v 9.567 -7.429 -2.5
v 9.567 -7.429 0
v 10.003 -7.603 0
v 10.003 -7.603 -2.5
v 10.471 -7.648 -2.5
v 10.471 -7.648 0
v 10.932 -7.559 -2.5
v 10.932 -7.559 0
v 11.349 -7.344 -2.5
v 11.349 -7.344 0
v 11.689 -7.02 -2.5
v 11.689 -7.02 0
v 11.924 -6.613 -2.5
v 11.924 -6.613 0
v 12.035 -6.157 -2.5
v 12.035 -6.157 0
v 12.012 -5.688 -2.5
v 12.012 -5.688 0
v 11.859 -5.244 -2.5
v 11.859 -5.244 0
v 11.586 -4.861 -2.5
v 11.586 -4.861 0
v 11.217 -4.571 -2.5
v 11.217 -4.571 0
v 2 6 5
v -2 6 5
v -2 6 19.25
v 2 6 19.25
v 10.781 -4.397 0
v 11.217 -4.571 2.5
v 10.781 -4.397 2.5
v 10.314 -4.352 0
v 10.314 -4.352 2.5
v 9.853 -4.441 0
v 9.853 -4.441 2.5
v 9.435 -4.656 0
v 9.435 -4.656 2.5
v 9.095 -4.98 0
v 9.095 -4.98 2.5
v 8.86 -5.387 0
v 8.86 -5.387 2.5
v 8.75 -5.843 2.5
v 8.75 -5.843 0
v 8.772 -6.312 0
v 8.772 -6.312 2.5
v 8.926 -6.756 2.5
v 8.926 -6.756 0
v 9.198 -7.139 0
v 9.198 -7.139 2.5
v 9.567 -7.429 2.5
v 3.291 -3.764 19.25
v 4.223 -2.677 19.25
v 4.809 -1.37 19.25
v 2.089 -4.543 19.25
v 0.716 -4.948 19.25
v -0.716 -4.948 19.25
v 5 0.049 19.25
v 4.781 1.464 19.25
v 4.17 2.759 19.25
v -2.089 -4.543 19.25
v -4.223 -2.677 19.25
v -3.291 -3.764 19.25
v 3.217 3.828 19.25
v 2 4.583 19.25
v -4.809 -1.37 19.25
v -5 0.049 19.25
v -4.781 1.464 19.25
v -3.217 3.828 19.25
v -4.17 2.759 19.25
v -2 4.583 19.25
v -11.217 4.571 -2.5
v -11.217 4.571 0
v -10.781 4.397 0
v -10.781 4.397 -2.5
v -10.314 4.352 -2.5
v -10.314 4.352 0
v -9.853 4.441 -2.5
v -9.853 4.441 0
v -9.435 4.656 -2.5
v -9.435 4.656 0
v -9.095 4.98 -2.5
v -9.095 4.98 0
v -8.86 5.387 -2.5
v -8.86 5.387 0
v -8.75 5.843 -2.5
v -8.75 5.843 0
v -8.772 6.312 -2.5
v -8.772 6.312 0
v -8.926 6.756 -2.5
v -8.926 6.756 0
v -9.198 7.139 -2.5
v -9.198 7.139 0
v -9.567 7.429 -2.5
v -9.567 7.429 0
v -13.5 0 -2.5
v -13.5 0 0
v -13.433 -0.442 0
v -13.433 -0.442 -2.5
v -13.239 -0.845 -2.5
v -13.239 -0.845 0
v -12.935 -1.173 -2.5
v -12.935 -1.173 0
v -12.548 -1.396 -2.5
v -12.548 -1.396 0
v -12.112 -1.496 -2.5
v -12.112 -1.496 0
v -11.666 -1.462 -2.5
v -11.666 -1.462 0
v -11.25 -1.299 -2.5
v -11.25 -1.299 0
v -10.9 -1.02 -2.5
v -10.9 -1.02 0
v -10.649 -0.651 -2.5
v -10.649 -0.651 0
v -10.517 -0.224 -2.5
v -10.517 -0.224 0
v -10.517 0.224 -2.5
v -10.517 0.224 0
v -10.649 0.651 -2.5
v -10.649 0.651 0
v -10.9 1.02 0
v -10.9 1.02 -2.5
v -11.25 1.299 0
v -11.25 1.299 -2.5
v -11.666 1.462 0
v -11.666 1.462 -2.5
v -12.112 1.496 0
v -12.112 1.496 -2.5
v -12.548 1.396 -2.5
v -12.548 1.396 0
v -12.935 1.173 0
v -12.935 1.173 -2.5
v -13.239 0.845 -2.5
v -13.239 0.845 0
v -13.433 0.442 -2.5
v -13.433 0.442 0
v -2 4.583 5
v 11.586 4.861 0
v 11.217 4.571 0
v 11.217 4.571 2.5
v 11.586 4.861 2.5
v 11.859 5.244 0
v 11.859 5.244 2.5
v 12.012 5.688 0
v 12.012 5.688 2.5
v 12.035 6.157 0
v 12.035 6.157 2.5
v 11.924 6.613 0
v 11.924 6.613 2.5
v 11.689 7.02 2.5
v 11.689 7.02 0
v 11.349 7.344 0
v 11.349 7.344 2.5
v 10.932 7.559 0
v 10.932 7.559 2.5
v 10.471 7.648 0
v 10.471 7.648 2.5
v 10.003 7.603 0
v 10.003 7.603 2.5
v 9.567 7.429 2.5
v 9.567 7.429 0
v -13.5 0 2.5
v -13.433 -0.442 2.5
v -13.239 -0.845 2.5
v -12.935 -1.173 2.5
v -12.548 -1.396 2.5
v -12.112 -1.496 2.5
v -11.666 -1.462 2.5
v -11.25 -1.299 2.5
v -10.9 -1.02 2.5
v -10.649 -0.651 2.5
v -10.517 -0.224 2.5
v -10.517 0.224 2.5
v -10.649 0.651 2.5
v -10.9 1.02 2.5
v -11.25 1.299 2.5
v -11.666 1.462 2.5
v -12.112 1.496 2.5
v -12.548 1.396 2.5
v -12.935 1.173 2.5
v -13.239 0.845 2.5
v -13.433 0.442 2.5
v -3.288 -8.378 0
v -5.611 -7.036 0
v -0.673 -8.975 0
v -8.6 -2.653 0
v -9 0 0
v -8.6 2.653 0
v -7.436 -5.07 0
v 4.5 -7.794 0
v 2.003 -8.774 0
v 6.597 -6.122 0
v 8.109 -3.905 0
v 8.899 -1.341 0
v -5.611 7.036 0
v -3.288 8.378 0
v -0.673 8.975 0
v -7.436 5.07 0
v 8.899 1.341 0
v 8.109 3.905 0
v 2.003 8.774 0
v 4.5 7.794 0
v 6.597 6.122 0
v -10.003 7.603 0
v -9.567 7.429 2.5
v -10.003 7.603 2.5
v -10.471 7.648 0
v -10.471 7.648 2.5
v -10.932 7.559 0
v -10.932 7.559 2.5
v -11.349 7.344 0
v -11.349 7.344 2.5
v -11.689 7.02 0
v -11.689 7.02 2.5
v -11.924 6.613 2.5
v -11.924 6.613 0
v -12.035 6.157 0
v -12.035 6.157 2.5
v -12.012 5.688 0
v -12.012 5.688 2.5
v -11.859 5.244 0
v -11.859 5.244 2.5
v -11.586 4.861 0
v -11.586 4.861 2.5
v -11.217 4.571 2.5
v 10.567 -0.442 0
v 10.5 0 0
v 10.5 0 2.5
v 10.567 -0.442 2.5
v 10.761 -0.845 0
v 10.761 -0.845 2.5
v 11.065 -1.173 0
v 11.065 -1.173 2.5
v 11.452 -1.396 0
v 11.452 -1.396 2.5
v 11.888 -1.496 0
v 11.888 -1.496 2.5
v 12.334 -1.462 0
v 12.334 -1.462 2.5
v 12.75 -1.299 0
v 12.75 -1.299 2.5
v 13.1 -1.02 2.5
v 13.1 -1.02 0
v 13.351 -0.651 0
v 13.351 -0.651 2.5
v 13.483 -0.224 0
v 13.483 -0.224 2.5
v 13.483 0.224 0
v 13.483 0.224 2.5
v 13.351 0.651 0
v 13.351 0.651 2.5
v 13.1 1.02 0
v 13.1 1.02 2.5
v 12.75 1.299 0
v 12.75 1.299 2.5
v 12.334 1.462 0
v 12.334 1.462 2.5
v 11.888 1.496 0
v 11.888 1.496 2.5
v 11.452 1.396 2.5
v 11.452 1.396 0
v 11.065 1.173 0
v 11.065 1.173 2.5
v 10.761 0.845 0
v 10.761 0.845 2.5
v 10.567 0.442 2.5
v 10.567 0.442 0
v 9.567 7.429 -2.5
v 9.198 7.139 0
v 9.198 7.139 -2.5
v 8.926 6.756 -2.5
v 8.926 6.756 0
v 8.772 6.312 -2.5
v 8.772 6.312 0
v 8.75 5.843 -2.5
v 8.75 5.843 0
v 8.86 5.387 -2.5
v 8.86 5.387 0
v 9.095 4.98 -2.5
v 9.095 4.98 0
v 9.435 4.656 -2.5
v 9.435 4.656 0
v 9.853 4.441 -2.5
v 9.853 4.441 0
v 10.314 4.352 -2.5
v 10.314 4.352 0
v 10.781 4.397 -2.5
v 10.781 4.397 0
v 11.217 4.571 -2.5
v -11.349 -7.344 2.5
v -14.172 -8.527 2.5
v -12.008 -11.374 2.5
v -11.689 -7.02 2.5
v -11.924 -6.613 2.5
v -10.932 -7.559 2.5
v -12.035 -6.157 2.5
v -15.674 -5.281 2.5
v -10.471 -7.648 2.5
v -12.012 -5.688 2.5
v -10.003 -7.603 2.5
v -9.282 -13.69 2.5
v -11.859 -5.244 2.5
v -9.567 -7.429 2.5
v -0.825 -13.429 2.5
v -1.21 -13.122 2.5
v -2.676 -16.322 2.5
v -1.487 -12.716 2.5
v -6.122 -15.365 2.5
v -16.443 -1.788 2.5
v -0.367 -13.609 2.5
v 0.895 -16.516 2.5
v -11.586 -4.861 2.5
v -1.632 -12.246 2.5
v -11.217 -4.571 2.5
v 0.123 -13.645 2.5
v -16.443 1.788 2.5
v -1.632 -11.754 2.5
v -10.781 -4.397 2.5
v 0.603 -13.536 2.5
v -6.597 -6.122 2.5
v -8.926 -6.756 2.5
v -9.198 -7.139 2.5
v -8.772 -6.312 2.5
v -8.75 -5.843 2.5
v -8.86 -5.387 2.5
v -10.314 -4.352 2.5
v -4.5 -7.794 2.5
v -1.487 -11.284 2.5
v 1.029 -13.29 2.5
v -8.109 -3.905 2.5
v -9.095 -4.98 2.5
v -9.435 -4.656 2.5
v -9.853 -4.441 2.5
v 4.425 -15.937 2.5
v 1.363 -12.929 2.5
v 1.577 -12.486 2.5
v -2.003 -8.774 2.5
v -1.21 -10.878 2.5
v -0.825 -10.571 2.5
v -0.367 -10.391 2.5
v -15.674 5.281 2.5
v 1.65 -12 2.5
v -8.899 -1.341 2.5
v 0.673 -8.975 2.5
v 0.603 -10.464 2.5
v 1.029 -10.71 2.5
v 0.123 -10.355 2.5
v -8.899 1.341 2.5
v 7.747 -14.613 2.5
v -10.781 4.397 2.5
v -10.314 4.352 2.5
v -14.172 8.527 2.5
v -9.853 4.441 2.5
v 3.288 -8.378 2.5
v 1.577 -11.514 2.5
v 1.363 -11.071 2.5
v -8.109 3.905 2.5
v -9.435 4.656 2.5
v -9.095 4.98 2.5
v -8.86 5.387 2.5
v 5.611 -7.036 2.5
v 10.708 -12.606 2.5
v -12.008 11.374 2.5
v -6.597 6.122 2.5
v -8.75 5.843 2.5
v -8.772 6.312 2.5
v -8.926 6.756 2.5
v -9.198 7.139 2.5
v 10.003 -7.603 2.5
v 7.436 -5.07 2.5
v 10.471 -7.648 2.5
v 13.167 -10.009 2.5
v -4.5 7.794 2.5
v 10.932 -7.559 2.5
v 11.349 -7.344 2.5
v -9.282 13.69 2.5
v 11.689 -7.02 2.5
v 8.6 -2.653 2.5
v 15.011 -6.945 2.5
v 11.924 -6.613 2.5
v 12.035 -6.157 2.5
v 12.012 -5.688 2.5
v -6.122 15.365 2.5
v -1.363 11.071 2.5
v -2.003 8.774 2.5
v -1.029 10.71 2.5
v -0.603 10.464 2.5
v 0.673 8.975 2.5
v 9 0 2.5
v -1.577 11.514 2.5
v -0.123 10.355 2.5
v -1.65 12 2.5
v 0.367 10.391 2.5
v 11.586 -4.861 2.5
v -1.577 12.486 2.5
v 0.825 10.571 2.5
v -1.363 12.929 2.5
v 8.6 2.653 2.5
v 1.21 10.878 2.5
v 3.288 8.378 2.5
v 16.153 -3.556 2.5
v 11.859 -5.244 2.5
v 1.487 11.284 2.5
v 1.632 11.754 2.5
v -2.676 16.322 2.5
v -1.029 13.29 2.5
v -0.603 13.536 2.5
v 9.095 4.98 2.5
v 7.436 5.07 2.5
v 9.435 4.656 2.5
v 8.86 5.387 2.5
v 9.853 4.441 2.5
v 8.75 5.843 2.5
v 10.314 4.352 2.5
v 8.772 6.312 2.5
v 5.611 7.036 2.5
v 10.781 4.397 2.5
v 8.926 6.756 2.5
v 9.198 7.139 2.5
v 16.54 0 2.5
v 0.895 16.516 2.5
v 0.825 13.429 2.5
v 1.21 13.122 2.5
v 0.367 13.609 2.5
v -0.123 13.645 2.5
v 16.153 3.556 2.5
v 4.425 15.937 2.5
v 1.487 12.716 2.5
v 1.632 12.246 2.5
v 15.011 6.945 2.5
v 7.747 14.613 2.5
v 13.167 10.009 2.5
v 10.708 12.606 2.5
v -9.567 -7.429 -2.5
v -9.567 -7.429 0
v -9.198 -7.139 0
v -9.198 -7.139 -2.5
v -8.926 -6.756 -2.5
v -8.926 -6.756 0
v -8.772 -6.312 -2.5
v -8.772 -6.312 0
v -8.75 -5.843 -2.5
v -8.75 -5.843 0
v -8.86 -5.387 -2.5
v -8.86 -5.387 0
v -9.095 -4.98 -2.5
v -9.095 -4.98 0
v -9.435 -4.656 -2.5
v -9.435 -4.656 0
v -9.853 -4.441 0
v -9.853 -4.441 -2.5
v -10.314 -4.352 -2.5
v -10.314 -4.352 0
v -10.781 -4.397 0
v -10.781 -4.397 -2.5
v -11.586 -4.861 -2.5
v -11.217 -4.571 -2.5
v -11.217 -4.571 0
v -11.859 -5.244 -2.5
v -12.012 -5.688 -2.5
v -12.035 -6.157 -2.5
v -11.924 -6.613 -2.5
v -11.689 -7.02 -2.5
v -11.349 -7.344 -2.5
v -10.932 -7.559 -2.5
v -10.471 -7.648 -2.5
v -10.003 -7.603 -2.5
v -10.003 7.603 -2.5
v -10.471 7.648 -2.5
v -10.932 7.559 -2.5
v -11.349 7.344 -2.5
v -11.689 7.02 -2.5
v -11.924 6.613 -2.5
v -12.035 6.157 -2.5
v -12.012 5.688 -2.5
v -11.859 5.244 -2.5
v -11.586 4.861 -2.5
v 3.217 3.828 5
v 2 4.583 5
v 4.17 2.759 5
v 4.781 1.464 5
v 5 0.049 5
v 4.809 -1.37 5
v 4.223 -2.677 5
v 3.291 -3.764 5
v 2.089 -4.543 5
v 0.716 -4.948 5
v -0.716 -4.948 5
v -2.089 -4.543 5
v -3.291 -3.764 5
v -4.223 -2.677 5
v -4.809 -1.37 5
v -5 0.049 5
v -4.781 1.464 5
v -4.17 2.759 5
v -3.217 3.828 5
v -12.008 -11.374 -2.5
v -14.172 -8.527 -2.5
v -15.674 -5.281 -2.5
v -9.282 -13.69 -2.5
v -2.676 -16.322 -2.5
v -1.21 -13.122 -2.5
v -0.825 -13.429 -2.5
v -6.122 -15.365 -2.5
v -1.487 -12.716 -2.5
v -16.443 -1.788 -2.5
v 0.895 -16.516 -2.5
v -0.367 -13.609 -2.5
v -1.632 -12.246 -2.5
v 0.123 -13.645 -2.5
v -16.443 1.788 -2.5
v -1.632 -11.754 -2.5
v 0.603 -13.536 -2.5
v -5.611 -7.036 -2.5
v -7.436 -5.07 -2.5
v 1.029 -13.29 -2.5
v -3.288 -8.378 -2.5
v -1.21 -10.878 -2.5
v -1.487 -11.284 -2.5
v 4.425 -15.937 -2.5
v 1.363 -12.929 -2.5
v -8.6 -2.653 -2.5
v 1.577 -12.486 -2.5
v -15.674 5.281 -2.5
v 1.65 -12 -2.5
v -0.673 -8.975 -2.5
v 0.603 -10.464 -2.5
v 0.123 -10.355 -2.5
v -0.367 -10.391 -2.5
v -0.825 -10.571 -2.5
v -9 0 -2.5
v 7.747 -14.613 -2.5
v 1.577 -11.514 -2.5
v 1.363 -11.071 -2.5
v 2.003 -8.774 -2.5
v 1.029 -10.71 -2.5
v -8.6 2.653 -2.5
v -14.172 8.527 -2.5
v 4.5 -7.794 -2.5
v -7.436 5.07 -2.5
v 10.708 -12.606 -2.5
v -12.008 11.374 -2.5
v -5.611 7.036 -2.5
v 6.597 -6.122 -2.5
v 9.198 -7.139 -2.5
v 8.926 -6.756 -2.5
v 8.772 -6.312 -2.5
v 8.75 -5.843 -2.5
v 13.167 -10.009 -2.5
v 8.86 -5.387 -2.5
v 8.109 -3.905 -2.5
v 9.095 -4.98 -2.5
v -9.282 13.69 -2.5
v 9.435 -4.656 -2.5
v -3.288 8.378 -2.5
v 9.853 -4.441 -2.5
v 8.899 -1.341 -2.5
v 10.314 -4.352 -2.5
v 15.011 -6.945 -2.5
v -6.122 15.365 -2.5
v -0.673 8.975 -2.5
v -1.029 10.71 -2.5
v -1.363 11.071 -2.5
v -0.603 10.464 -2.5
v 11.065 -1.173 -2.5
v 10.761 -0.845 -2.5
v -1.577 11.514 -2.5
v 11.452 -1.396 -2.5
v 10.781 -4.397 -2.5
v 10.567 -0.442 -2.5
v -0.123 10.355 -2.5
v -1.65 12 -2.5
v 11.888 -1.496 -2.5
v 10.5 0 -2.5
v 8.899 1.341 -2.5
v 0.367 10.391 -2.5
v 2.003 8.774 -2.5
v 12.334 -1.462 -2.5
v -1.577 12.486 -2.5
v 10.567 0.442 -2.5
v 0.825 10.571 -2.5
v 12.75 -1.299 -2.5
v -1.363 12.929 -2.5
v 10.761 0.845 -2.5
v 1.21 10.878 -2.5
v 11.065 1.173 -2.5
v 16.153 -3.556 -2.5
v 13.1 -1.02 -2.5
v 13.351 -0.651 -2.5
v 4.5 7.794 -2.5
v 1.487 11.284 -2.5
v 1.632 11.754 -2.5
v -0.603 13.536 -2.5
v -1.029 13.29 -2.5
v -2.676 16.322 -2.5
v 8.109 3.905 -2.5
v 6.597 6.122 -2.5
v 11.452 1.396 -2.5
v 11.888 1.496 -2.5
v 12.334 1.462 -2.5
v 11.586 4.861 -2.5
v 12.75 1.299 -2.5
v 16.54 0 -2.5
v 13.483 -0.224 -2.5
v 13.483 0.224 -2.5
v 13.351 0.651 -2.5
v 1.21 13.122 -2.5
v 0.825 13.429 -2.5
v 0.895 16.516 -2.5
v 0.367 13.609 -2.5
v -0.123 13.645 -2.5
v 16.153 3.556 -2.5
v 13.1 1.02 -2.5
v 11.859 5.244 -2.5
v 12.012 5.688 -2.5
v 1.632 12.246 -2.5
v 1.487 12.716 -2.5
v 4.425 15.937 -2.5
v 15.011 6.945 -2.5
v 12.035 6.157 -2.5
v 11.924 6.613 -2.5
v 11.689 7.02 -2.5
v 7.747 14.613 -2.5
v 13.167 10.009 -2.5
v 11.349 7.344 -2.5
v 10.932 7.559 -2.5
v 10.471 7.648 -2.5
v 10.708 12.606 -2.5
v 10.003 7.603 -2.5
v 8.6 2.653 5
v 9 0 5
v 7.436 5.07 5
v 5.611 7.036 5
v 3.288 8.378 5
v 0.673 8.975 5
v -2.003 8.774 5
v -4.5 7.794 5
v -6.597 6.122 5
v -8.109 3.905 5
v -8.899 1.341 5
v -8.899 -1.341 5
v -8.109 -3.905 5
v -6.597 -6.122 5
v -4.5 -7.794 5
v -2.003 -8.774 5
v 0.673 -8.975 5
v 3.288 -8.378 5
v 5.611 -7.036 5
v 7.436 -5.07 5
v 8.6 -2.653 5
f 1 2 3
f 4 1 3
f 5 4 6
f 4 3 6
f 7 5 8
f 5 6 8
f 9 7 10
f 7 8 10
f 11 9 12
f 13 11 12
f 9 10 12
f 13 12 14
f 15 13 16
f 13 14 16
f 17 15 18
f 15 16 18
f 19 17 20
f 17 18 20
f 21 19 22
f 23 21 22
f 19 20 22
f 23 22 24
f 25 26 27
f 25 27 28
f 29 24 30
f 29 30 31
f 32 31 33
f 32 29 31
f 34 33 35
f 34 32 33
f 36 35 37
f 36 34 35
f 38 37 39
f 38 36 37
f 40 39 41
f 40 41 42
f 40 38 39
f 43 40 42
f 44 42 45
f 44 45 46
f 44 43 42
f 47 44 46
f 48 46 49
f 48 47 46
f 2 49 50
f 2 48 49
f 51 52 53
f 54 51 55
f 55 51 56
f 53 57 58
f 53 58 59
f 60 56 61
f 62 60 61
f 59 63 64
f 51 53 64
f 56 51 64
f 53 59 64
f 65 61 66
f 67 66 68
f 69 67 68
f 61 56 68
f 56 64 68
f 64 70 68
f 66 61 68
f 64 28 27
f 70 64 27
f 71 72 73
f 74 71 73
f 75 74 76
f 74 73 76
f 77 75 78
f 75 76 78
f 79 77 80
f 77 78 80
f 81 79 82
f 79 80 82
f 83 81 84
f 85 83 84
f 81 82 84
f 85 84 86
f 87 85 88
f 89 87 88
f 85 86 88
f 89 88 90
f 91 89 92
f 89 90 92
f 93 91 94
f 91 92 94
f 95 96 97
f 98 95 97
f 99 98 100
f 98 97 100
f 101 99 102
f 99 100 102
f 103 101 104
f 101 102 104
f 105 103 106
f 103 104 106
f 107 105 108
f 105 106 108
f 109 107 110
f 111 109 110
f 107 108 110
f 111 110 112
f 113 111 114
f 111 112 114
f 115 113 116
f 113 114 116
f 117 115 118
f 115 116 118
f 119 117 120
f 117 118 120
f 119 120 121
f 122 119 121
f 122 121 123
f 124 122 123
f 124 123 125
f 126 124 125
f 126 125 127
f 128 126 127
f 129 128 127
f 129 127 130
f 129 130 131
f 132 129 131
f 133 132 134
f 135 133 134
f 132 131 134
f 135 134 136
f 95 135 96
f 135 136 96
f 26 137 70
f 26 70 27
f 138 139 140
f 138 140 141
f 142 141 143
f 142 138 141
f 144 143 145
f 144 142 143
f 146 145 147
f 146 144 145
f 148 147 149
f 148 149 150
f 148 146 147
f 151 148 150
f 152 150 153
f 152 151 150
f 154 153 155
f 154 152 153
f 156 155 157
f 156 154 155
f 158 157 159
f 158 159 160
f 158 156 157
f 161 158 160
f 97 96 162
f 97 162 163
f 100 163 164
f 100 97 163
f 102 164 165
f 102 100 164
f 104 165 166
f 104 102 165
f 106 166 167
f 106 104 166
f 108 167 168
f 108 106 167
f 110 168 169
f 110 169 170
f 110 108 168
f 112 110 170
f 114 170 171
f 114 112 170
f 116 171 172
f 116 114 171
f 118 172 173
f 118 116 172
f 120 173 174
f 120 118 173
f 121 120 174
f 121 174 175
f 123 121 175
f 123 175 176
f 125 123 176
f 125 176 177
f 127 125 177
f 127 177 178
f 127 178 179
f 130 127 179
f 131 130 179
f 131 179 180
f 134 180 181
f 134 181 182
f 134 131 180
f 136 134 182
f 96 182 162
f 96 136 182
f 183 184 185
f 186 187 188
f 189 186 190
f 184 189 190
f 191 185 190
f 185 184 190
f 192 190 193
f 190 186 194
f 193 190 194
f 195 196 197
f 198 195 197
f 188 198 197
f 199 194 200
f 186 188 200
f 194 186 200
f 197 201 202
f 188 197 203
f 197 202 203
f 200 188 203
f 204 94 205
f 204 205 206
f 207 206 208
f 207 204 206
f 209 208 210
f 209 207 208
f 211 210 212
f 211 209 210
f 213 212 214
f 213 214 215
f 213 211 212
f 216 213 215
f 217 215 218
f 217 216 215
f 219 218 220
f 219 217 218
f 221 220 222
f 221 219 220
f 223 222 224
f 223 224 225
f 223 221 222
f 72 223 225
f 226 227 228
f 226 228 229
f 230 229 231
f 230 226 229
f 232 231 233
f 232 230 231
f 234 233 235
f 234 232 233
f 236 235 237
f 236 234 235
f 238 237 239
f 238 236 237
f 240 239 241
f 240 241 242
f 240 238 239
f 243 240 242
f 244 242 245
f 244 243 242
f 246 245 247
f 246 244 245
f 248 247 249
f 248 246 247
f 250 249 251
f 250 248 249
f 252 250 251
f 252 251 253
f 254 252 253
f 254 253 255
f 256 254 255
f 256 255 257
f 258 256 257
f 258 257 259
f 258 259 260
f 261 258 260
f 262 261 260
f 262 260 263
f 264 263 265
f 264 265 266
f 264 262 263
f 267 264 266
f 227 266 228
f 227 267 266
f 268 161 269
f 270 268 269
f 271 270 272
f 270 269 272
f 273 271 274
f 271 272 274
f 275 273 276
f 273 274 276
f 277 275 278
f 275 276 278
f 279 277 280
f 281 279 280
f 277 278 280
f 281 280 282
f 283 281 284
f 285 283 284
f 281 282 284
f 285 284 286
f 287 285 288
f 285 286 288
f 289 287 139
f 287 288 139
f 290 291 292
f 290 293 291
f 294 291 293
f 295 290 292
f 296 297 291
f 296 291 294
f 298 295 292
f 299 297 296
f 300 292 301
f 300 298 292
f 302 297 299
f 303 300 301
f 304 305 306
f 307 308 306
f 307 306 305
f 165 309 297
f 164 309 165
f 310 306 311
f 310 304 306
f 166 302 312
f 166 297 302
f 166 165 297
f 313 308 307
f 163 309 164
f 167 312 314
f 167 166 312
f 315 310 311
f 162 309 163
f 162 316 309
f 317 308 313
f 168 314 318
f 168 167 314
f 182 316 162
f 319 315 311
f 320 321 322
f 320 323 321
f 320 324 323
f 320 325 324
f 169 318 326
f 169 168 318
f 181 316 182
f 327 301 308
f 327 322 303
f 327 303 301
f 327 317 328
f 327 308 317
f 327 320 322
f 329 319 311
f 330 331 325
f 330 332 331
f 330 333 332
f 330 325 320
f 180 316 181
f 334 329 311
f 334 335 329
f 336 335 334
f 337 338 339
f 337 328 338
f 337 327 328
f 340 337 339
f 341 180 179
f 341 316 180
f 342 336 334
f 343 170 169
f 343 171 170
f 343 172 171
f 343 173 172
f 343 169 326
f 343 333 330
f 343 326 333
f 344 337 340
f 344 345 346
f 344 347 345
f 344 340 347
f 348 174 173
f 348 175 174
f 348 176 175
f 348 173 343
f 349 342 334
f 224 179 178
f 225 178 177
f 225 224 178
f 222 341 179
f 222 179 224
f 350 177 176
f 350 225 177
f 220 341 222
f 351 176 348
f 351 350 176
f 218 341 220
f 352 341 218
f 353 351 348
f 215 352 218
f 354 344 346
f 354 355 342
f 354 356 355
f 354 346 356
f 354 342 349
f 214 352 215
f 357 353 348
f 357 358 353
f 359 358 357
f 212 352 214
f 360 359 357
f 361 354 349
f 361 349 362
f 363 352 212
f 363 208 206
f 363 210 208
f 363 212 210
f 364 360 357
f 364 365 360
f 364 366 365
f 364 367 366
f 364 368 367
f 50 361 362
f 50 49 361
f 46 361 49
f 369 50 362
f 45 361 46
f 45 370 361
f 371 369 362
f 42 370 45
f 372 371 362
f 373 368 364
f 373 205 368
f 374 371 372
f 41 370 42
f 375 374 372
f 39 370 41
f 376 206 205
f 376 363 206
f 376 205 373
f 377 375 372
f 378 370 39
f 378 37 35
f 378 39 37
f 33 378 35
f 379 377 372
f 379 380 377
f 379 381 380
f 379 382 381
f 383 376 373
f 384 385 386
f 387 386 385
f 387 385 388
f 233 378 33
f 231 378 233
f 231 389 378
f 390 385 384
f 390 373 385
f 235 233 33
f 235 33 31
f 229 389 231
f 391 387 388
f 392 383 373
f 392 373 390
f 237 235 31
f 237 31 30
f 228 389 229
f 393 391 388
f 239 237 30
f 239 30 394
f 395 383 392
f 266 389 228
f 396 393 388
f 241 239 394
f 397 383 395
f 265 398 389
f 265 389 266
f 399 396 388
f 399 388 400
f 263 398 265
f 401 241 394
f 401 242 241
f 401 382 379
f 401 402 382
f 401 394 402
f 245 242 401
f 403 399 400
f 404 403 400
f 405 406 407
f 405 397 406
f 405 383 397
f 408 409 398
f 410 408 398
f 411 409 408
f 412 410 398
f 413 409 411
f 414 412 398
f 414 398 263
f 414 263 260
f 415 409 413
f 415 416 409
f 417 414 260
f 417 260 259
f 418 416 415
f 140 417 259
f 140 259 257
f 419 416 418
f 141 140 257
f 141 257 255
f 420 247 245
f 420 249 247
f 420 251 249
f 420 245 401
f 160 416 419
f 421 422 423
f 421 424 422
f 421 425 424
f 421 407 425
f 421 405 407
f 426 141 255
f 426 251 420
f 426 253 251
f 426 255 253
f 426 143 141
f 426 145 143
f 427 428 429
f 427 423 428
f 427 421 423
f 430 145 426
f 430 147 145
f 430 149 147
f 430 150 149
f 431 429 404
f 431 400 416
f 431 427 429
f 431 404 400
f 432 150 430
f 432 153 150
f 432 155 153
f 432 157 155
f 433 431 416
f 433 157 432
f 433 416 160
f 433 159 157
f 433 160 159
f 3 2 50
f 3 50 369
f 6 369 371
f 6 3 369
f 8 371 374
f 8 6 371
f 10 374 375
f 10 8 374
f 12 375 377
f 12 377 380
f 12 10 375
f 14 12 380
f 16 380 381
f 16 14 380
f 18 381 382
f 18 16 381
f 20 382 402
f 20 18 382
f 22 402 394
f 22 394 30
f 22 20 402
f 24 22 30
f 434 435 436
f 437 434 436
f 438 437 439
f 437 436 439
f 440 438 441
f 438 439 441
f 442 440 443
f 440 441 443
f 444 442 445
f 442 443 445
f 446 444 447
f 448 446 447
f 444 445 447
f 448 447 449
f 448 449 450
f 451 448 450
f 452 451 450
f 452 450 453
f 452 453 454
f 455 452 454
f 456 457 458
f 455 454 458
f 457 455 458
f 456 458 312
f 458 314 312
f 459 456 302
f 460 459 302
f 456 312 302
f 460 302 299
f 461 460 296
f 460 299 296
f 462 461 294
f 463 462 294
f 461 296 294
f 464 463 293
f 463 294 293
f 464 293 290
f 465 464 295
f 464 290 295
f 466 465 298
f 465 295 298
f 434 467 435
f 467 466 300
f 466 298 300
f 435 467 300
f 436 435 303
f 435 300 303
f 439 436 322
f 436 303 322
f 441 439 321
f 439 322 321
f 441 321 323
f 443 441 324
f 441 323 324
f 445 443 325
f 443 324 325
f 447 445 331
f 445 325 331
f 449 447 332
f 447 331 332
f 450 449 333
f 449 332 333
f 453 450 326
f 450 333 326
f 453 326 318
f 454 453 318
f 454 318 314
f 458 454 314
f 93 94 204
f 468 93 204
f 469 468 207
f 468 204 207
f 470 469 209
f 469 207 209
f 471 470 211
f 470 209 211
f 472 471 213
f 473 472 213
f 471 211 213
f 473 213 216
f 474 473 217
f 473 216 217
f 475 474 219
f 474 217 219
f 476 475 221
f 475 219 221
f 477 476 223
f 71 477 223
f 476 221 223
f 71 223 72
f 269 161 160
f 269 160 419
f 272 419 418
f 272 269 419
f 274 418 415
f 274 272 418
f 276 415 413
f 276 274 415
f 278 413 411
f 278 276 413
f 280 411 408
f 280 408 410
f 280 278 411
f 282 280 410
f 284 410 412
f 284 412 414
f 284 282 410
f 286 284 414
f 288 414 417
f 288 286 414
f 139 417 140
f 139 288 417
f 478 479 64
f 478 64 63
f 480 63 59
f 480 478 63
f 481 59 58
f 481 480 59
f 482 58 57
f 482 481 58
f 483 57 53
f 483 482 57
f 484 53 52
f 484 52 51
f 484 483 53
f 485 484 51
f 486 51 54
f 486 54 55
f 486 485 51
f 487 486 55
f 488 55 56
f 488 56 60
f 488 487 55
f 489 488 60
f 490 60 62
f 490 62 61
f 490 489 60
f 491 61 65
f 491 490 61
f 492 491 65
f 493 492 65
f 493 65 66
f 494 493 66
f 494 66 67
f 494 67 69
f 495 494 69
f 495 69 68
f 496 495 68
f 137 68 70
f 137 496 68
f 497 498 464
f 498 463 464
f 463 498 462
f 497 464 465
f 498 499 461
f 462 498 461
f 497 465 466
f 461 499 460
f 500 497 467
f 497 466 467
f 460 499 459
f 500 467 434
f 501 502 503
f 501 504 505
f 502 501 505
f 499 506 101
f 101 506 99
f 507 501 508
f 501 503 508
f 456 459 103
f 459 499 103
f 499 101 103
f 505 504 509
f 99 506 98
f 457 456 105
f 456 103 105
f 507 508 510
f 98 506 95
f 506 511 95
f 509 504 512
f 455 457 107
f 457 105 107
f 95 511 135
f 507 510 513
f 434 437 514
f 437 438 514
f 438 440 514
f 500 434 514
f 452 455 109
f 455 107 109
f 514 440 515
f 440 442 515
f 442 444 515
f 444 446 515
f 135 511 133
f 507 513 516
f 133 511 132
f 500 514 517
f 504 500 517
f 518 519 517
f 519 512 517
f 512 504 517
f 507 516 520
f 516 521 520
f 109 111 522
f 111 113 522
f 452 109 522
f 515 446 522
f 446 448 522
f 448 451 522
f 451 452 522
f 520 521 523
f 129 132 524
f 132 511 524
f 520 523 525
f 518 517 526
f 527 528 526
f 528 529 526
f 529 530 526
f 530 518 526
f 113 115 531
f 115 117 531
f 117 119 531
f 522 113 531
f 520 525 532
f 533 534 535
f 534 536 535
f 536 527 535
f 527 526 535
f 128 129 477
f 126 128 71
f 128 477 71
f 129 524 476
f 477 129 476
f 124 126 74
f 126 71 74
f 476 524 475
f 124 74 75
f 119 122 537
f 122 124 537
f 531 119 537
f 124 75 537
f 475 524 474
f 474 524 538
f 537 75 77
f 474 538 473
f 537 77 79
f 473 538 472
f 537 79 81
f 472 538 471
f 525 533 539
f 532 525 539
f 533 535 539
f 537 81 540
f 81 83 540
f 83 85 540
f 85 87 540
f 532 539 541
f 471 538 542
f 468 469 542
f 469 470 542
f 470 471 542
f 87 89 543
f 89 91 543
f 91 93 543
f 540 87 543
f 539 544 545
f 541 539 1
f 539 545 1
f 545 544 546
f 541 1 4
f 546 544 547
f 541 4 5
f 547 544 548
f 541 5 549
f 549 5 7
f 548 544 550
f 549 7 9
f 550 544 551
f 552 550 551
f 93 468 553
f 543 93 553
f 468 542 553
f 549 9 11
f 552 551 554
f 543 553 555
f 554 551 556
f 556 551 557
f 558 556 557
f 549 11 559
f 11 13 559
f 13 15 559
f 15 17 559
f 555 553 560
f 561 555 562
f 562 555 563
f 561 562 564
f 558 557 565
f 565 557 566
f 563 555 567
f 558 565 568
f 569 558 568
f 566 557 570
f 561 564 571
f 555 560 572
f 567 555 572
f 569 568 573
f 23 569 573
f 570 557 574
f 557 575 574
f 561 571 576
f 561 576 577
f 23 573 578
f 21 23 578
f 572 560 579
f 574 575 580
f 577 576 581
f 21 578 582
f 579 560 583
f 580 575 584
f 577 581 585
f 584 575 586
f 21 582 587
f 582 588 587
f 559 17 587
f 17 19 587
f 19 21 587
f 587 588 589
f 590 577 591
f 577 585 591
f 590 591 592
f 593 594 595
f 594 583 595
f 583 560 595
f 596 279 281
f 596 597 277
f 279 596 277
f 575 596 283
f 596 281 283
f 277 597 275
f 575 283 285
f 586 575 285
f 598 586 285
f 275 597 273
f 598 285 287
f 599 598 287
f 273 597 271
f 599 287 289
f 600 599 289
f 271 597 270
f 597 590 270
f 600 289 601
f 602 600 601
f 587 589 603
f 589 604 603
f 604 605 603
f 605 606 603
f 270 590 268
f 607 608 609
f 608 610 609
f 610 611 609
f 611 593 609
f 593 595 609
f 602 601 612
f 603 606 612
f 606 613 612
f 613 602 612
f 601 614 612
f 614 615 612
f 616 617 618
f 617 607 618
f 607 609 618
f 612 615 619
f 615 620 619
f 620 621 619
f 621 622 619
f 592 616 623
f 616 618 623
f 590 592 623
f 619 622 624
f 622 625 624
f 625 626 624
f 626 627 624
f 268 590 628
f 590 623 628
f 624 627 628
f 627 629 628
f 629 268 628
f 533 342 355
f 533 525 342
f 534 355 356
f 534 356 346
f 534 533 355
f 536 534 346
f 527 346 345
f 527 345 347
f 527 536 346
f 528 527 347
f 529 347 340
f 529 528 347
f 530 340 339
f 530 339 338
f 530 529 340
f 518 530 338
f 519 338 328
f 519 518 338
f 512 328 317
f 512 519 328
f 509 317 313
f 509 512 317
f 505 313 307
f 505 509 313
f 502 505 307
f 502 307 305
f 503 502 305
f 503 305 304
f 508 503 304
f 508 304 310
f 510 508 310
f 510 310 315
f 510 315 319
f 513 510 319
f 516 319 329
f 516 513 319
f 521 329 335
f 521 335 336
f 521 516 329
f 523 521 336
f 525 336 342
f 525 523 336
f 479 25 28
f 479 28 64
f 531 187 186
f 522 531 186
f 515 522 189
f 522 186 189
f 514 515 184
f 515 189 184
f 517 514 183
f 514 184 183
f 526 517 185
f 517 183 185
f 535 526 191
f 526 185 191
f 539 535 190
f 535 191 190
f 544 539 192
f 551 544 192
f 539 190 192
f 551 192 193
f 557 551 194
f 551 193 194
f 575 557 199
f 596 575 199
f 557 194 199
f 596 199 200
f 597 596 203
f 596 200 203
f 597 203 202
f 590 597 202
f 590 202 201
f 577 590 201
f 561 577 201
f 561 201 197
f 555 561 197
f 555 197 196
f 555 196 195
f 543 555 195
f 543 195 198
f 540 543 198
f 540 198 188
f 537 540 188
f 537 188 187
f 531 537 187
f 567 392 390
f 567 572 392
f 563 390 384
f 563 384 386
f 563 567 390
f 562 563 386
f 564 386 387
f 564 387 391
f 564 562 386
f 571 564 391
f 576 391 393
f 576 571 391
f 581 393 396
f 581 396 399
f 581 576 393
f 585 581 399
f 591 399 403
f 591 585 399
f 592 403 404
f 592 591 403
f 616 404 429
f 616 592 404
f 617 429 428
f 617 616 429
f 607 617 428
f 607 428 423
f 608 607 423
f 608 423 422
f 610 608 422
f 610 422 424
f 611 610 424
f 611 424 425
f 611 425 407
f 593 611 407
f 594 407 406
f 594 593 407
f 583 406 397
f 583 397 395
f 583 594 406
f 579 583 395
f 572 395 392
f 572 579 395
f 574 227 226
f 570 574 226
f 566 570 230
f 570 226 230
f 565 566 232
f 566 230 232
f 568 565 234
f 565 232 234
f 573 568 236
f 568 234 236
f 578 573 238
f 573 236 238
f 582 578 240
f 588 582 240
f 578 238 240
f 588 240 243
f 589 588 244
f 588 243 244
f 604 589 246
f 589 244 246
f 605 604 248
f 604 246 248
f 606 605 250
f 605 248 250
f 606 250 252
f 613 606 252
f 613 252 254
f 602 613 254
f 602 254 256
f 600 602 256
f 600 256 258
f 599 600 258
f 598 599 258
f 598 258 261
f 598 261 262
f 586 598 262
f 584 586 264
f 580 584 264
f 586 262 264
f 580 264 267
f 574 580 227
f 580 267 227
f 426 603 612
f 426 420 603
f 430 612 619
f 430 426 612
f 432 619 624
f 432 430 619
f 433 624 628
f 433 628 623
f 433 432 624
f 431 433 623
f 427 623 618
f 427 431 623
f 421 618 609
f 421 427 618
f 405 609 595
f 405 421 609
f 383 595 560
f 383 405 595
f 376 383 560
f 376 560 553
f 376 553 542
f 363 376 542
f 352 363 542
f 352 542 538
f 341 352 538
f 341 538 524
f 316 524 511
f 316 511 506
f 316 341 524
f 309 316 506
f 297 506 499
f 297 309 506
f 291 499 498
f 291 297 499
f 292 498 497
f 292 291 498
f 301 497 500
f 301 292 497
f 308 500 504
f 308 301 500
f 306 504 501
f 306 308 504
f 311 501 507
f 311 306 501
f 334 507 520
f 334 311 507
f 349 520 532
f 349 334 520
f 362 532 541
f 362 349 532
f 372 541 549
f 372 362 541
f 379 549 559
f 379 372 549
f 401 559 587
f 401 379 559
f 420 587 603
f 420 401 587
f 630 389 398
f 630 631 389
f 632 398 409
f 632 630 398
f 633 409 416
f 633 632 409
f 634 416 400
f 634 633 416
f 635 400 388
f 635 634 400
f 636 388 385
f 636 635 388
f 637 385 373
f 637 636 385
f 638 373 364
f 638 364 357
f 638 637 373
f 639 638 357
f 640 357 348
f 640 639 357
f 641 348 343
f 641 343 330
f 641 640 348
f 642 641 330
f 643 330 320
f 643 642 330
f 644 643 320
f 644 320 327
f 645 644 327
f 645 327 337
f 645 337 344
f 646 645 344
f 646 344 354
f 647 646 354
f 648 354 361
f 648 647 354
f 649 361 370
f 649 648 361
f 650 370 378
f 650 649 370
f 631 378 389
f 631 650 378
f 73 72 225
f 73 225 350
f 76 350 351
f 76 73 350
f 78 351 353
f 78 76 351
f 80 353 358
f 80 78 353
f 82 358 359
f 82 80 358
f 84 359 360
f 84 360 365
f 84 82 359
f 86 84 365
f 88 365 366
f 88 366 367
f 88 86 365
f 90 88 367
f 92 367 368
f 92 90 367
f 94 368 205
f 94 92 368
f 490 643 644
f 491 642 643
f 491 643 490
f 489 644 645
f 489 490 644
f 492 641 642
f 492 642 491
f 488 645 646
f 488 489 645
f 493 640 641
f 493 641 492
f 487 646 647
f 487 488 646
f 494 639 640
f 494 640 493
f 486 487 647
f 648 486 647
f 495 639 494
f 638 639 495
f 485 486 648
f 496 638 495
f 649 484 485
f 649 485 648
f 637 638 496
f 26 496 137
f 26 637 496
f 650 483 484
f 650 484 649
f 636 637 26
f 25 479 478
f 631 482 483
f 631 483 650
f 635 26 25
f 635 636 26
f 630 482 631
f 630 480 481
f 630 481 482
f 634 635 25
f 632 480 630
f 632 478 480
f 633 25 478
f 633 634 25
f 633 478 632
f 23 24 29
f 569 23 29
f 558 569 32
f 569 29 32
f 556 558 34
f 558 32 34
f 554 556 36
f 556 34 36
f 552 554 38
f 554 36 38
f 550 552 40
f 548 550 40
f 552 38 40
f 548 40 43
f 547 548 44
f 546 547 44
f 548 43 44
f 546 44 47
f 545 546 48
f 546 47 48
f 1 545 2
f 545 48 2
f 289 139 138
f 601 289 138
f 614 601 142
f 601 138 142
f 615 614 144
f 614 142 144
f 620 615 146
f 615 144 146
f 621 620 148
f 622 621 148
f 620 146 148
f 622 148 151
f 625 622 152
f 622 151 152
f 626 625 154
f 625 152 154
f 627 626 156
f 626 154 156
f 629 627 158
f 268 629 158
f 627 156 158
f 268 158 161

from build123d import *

# Parameters (mm, degrees)
SKETCH1_R           = 16.539827403
BOSS_EXTRUDE1_DEPTH = 2.5
SKETCH3_R           = 9
BOSS_EXTRUDE3_DEPTH = 2.5
BOSS_EXTRUDE5_DEPTH = 14.25


with BuildPart() as part:
    # Sketch1 → Boss-Extrude1 (new, symmetric)
    with BuildSketch(Plane.XY):
        Circle(SKETCH1_R)
        with BuildLine():
            ThreePointArc((9, 0), (0, 9), (-9, 0))
            ThreePointArc((-9, 0), (0, -9), (9, 0))
        make_face(mode=Mode.SUBTRACT)
        with BuildLine():
            ThreePointArc((1.65, 12), (0, 13.65), (-1.65, 12))
            ThreePointArc((-1.65, 12), (0, 10.35), (1.65, 12))
        make_face(mode=Mode.SUBTRACT)
        with BuildLine():
            ThreePointArc((11.217304845, 4.571058084), (11.821246762, 6.825), (9.567304845, 7.428941916))
            ThreePointArc((9.567304845, 7.428941916), (8.963362929, 5.175), (11.217304845, 4.571058084))
        make_face(mode=Mode.SUBTRACT)
        with BuildLine():
            ThreePointArc((9.567304845, -7.428941916), (11.821246762, -6.825), (11.217304845, -4.571058084))
            ThreePointArc((11.217304845, -4.571058084), (8.963362929, -5.175), (9.567304845, -7.428941916))
        make_face(mode=Mode.SUBTRACT)
        with BuildLine():
            ThreePointArc((-1.65, -12), (0, -13.65), (1.65, -12))
            ThreePointArc((1.65, -12), (0, -10.35), (-1.65, -12))
        make_face(mode=Mode.SUBTRACT)
        with BuildLine():
            ThreePointArc((-11.217304845, -4.571058084), (-11.821246762, -6.825), (-9.567304845, -7.428941916))
            ThreePointArc((-9.567304845, -7.428941916), (-8.963362929, -5.175), (-11.217304845, -4.571058084))
        make_face(mode=Mode.SUBTRACT)
        with BuildLine():
            ThreePointArc((-9.567304845, 7.428941916), (-11.821246762, 6.825), (-11.217304845, 4.571058084))
            ThreePointArc((-11.217304845, 4.571058084), (-8.963362929, 5.175), (-9.567304845, 7.428941916))
        make_face(mode=Mode.SUBTRACT)
        with BuildLine():
            ThreePointArc((13.5, 0), (12, 1.5), (10.5, 0))
            ThreePointArc((10.5, 0), (12, -1.5), (13.5, 0))
        make_face(mode=Mode.SUBTRACT)
        with BuildLine():
            ThreePointArc((-10.5, 0), (-12, 1.5), (-13.5, 0))
            ThreePointArc((-13.5, 0), (-12, -1.5), (-10.5, 0))
        make_face(mode=Mode.SUBTRACT)
    extrude(amount=BOSS_EXTRUDE1_DEPTH, both=True)

    # Sketch3 → Boss-Extrude3 (add, symmetric)
    with BuildSketch(Plane.XY.offset(2.5)):
        Circle(SKETCH3_R)
    extrude(amount=BOSS_EXTRUDE3_DEPTH, both=True)

    # Sketch4 → Boss-Extrude5 (add)
    with BuildSketch(Plane.XY.offset(5)):
        with BuildLine():
            Line((-2, 4.582575695), (-2, 6))
            Line((-2, 6), (2, 6))
            Line((2, 6), (2, 4.582575695))
            ThreePointArc((2, 4.582575695), (0, -5), (-2, 4.582575695))
        make_face()
    extrude(amount=BOSS_EXTRUDE5_DEPTH)


solid = part.part
